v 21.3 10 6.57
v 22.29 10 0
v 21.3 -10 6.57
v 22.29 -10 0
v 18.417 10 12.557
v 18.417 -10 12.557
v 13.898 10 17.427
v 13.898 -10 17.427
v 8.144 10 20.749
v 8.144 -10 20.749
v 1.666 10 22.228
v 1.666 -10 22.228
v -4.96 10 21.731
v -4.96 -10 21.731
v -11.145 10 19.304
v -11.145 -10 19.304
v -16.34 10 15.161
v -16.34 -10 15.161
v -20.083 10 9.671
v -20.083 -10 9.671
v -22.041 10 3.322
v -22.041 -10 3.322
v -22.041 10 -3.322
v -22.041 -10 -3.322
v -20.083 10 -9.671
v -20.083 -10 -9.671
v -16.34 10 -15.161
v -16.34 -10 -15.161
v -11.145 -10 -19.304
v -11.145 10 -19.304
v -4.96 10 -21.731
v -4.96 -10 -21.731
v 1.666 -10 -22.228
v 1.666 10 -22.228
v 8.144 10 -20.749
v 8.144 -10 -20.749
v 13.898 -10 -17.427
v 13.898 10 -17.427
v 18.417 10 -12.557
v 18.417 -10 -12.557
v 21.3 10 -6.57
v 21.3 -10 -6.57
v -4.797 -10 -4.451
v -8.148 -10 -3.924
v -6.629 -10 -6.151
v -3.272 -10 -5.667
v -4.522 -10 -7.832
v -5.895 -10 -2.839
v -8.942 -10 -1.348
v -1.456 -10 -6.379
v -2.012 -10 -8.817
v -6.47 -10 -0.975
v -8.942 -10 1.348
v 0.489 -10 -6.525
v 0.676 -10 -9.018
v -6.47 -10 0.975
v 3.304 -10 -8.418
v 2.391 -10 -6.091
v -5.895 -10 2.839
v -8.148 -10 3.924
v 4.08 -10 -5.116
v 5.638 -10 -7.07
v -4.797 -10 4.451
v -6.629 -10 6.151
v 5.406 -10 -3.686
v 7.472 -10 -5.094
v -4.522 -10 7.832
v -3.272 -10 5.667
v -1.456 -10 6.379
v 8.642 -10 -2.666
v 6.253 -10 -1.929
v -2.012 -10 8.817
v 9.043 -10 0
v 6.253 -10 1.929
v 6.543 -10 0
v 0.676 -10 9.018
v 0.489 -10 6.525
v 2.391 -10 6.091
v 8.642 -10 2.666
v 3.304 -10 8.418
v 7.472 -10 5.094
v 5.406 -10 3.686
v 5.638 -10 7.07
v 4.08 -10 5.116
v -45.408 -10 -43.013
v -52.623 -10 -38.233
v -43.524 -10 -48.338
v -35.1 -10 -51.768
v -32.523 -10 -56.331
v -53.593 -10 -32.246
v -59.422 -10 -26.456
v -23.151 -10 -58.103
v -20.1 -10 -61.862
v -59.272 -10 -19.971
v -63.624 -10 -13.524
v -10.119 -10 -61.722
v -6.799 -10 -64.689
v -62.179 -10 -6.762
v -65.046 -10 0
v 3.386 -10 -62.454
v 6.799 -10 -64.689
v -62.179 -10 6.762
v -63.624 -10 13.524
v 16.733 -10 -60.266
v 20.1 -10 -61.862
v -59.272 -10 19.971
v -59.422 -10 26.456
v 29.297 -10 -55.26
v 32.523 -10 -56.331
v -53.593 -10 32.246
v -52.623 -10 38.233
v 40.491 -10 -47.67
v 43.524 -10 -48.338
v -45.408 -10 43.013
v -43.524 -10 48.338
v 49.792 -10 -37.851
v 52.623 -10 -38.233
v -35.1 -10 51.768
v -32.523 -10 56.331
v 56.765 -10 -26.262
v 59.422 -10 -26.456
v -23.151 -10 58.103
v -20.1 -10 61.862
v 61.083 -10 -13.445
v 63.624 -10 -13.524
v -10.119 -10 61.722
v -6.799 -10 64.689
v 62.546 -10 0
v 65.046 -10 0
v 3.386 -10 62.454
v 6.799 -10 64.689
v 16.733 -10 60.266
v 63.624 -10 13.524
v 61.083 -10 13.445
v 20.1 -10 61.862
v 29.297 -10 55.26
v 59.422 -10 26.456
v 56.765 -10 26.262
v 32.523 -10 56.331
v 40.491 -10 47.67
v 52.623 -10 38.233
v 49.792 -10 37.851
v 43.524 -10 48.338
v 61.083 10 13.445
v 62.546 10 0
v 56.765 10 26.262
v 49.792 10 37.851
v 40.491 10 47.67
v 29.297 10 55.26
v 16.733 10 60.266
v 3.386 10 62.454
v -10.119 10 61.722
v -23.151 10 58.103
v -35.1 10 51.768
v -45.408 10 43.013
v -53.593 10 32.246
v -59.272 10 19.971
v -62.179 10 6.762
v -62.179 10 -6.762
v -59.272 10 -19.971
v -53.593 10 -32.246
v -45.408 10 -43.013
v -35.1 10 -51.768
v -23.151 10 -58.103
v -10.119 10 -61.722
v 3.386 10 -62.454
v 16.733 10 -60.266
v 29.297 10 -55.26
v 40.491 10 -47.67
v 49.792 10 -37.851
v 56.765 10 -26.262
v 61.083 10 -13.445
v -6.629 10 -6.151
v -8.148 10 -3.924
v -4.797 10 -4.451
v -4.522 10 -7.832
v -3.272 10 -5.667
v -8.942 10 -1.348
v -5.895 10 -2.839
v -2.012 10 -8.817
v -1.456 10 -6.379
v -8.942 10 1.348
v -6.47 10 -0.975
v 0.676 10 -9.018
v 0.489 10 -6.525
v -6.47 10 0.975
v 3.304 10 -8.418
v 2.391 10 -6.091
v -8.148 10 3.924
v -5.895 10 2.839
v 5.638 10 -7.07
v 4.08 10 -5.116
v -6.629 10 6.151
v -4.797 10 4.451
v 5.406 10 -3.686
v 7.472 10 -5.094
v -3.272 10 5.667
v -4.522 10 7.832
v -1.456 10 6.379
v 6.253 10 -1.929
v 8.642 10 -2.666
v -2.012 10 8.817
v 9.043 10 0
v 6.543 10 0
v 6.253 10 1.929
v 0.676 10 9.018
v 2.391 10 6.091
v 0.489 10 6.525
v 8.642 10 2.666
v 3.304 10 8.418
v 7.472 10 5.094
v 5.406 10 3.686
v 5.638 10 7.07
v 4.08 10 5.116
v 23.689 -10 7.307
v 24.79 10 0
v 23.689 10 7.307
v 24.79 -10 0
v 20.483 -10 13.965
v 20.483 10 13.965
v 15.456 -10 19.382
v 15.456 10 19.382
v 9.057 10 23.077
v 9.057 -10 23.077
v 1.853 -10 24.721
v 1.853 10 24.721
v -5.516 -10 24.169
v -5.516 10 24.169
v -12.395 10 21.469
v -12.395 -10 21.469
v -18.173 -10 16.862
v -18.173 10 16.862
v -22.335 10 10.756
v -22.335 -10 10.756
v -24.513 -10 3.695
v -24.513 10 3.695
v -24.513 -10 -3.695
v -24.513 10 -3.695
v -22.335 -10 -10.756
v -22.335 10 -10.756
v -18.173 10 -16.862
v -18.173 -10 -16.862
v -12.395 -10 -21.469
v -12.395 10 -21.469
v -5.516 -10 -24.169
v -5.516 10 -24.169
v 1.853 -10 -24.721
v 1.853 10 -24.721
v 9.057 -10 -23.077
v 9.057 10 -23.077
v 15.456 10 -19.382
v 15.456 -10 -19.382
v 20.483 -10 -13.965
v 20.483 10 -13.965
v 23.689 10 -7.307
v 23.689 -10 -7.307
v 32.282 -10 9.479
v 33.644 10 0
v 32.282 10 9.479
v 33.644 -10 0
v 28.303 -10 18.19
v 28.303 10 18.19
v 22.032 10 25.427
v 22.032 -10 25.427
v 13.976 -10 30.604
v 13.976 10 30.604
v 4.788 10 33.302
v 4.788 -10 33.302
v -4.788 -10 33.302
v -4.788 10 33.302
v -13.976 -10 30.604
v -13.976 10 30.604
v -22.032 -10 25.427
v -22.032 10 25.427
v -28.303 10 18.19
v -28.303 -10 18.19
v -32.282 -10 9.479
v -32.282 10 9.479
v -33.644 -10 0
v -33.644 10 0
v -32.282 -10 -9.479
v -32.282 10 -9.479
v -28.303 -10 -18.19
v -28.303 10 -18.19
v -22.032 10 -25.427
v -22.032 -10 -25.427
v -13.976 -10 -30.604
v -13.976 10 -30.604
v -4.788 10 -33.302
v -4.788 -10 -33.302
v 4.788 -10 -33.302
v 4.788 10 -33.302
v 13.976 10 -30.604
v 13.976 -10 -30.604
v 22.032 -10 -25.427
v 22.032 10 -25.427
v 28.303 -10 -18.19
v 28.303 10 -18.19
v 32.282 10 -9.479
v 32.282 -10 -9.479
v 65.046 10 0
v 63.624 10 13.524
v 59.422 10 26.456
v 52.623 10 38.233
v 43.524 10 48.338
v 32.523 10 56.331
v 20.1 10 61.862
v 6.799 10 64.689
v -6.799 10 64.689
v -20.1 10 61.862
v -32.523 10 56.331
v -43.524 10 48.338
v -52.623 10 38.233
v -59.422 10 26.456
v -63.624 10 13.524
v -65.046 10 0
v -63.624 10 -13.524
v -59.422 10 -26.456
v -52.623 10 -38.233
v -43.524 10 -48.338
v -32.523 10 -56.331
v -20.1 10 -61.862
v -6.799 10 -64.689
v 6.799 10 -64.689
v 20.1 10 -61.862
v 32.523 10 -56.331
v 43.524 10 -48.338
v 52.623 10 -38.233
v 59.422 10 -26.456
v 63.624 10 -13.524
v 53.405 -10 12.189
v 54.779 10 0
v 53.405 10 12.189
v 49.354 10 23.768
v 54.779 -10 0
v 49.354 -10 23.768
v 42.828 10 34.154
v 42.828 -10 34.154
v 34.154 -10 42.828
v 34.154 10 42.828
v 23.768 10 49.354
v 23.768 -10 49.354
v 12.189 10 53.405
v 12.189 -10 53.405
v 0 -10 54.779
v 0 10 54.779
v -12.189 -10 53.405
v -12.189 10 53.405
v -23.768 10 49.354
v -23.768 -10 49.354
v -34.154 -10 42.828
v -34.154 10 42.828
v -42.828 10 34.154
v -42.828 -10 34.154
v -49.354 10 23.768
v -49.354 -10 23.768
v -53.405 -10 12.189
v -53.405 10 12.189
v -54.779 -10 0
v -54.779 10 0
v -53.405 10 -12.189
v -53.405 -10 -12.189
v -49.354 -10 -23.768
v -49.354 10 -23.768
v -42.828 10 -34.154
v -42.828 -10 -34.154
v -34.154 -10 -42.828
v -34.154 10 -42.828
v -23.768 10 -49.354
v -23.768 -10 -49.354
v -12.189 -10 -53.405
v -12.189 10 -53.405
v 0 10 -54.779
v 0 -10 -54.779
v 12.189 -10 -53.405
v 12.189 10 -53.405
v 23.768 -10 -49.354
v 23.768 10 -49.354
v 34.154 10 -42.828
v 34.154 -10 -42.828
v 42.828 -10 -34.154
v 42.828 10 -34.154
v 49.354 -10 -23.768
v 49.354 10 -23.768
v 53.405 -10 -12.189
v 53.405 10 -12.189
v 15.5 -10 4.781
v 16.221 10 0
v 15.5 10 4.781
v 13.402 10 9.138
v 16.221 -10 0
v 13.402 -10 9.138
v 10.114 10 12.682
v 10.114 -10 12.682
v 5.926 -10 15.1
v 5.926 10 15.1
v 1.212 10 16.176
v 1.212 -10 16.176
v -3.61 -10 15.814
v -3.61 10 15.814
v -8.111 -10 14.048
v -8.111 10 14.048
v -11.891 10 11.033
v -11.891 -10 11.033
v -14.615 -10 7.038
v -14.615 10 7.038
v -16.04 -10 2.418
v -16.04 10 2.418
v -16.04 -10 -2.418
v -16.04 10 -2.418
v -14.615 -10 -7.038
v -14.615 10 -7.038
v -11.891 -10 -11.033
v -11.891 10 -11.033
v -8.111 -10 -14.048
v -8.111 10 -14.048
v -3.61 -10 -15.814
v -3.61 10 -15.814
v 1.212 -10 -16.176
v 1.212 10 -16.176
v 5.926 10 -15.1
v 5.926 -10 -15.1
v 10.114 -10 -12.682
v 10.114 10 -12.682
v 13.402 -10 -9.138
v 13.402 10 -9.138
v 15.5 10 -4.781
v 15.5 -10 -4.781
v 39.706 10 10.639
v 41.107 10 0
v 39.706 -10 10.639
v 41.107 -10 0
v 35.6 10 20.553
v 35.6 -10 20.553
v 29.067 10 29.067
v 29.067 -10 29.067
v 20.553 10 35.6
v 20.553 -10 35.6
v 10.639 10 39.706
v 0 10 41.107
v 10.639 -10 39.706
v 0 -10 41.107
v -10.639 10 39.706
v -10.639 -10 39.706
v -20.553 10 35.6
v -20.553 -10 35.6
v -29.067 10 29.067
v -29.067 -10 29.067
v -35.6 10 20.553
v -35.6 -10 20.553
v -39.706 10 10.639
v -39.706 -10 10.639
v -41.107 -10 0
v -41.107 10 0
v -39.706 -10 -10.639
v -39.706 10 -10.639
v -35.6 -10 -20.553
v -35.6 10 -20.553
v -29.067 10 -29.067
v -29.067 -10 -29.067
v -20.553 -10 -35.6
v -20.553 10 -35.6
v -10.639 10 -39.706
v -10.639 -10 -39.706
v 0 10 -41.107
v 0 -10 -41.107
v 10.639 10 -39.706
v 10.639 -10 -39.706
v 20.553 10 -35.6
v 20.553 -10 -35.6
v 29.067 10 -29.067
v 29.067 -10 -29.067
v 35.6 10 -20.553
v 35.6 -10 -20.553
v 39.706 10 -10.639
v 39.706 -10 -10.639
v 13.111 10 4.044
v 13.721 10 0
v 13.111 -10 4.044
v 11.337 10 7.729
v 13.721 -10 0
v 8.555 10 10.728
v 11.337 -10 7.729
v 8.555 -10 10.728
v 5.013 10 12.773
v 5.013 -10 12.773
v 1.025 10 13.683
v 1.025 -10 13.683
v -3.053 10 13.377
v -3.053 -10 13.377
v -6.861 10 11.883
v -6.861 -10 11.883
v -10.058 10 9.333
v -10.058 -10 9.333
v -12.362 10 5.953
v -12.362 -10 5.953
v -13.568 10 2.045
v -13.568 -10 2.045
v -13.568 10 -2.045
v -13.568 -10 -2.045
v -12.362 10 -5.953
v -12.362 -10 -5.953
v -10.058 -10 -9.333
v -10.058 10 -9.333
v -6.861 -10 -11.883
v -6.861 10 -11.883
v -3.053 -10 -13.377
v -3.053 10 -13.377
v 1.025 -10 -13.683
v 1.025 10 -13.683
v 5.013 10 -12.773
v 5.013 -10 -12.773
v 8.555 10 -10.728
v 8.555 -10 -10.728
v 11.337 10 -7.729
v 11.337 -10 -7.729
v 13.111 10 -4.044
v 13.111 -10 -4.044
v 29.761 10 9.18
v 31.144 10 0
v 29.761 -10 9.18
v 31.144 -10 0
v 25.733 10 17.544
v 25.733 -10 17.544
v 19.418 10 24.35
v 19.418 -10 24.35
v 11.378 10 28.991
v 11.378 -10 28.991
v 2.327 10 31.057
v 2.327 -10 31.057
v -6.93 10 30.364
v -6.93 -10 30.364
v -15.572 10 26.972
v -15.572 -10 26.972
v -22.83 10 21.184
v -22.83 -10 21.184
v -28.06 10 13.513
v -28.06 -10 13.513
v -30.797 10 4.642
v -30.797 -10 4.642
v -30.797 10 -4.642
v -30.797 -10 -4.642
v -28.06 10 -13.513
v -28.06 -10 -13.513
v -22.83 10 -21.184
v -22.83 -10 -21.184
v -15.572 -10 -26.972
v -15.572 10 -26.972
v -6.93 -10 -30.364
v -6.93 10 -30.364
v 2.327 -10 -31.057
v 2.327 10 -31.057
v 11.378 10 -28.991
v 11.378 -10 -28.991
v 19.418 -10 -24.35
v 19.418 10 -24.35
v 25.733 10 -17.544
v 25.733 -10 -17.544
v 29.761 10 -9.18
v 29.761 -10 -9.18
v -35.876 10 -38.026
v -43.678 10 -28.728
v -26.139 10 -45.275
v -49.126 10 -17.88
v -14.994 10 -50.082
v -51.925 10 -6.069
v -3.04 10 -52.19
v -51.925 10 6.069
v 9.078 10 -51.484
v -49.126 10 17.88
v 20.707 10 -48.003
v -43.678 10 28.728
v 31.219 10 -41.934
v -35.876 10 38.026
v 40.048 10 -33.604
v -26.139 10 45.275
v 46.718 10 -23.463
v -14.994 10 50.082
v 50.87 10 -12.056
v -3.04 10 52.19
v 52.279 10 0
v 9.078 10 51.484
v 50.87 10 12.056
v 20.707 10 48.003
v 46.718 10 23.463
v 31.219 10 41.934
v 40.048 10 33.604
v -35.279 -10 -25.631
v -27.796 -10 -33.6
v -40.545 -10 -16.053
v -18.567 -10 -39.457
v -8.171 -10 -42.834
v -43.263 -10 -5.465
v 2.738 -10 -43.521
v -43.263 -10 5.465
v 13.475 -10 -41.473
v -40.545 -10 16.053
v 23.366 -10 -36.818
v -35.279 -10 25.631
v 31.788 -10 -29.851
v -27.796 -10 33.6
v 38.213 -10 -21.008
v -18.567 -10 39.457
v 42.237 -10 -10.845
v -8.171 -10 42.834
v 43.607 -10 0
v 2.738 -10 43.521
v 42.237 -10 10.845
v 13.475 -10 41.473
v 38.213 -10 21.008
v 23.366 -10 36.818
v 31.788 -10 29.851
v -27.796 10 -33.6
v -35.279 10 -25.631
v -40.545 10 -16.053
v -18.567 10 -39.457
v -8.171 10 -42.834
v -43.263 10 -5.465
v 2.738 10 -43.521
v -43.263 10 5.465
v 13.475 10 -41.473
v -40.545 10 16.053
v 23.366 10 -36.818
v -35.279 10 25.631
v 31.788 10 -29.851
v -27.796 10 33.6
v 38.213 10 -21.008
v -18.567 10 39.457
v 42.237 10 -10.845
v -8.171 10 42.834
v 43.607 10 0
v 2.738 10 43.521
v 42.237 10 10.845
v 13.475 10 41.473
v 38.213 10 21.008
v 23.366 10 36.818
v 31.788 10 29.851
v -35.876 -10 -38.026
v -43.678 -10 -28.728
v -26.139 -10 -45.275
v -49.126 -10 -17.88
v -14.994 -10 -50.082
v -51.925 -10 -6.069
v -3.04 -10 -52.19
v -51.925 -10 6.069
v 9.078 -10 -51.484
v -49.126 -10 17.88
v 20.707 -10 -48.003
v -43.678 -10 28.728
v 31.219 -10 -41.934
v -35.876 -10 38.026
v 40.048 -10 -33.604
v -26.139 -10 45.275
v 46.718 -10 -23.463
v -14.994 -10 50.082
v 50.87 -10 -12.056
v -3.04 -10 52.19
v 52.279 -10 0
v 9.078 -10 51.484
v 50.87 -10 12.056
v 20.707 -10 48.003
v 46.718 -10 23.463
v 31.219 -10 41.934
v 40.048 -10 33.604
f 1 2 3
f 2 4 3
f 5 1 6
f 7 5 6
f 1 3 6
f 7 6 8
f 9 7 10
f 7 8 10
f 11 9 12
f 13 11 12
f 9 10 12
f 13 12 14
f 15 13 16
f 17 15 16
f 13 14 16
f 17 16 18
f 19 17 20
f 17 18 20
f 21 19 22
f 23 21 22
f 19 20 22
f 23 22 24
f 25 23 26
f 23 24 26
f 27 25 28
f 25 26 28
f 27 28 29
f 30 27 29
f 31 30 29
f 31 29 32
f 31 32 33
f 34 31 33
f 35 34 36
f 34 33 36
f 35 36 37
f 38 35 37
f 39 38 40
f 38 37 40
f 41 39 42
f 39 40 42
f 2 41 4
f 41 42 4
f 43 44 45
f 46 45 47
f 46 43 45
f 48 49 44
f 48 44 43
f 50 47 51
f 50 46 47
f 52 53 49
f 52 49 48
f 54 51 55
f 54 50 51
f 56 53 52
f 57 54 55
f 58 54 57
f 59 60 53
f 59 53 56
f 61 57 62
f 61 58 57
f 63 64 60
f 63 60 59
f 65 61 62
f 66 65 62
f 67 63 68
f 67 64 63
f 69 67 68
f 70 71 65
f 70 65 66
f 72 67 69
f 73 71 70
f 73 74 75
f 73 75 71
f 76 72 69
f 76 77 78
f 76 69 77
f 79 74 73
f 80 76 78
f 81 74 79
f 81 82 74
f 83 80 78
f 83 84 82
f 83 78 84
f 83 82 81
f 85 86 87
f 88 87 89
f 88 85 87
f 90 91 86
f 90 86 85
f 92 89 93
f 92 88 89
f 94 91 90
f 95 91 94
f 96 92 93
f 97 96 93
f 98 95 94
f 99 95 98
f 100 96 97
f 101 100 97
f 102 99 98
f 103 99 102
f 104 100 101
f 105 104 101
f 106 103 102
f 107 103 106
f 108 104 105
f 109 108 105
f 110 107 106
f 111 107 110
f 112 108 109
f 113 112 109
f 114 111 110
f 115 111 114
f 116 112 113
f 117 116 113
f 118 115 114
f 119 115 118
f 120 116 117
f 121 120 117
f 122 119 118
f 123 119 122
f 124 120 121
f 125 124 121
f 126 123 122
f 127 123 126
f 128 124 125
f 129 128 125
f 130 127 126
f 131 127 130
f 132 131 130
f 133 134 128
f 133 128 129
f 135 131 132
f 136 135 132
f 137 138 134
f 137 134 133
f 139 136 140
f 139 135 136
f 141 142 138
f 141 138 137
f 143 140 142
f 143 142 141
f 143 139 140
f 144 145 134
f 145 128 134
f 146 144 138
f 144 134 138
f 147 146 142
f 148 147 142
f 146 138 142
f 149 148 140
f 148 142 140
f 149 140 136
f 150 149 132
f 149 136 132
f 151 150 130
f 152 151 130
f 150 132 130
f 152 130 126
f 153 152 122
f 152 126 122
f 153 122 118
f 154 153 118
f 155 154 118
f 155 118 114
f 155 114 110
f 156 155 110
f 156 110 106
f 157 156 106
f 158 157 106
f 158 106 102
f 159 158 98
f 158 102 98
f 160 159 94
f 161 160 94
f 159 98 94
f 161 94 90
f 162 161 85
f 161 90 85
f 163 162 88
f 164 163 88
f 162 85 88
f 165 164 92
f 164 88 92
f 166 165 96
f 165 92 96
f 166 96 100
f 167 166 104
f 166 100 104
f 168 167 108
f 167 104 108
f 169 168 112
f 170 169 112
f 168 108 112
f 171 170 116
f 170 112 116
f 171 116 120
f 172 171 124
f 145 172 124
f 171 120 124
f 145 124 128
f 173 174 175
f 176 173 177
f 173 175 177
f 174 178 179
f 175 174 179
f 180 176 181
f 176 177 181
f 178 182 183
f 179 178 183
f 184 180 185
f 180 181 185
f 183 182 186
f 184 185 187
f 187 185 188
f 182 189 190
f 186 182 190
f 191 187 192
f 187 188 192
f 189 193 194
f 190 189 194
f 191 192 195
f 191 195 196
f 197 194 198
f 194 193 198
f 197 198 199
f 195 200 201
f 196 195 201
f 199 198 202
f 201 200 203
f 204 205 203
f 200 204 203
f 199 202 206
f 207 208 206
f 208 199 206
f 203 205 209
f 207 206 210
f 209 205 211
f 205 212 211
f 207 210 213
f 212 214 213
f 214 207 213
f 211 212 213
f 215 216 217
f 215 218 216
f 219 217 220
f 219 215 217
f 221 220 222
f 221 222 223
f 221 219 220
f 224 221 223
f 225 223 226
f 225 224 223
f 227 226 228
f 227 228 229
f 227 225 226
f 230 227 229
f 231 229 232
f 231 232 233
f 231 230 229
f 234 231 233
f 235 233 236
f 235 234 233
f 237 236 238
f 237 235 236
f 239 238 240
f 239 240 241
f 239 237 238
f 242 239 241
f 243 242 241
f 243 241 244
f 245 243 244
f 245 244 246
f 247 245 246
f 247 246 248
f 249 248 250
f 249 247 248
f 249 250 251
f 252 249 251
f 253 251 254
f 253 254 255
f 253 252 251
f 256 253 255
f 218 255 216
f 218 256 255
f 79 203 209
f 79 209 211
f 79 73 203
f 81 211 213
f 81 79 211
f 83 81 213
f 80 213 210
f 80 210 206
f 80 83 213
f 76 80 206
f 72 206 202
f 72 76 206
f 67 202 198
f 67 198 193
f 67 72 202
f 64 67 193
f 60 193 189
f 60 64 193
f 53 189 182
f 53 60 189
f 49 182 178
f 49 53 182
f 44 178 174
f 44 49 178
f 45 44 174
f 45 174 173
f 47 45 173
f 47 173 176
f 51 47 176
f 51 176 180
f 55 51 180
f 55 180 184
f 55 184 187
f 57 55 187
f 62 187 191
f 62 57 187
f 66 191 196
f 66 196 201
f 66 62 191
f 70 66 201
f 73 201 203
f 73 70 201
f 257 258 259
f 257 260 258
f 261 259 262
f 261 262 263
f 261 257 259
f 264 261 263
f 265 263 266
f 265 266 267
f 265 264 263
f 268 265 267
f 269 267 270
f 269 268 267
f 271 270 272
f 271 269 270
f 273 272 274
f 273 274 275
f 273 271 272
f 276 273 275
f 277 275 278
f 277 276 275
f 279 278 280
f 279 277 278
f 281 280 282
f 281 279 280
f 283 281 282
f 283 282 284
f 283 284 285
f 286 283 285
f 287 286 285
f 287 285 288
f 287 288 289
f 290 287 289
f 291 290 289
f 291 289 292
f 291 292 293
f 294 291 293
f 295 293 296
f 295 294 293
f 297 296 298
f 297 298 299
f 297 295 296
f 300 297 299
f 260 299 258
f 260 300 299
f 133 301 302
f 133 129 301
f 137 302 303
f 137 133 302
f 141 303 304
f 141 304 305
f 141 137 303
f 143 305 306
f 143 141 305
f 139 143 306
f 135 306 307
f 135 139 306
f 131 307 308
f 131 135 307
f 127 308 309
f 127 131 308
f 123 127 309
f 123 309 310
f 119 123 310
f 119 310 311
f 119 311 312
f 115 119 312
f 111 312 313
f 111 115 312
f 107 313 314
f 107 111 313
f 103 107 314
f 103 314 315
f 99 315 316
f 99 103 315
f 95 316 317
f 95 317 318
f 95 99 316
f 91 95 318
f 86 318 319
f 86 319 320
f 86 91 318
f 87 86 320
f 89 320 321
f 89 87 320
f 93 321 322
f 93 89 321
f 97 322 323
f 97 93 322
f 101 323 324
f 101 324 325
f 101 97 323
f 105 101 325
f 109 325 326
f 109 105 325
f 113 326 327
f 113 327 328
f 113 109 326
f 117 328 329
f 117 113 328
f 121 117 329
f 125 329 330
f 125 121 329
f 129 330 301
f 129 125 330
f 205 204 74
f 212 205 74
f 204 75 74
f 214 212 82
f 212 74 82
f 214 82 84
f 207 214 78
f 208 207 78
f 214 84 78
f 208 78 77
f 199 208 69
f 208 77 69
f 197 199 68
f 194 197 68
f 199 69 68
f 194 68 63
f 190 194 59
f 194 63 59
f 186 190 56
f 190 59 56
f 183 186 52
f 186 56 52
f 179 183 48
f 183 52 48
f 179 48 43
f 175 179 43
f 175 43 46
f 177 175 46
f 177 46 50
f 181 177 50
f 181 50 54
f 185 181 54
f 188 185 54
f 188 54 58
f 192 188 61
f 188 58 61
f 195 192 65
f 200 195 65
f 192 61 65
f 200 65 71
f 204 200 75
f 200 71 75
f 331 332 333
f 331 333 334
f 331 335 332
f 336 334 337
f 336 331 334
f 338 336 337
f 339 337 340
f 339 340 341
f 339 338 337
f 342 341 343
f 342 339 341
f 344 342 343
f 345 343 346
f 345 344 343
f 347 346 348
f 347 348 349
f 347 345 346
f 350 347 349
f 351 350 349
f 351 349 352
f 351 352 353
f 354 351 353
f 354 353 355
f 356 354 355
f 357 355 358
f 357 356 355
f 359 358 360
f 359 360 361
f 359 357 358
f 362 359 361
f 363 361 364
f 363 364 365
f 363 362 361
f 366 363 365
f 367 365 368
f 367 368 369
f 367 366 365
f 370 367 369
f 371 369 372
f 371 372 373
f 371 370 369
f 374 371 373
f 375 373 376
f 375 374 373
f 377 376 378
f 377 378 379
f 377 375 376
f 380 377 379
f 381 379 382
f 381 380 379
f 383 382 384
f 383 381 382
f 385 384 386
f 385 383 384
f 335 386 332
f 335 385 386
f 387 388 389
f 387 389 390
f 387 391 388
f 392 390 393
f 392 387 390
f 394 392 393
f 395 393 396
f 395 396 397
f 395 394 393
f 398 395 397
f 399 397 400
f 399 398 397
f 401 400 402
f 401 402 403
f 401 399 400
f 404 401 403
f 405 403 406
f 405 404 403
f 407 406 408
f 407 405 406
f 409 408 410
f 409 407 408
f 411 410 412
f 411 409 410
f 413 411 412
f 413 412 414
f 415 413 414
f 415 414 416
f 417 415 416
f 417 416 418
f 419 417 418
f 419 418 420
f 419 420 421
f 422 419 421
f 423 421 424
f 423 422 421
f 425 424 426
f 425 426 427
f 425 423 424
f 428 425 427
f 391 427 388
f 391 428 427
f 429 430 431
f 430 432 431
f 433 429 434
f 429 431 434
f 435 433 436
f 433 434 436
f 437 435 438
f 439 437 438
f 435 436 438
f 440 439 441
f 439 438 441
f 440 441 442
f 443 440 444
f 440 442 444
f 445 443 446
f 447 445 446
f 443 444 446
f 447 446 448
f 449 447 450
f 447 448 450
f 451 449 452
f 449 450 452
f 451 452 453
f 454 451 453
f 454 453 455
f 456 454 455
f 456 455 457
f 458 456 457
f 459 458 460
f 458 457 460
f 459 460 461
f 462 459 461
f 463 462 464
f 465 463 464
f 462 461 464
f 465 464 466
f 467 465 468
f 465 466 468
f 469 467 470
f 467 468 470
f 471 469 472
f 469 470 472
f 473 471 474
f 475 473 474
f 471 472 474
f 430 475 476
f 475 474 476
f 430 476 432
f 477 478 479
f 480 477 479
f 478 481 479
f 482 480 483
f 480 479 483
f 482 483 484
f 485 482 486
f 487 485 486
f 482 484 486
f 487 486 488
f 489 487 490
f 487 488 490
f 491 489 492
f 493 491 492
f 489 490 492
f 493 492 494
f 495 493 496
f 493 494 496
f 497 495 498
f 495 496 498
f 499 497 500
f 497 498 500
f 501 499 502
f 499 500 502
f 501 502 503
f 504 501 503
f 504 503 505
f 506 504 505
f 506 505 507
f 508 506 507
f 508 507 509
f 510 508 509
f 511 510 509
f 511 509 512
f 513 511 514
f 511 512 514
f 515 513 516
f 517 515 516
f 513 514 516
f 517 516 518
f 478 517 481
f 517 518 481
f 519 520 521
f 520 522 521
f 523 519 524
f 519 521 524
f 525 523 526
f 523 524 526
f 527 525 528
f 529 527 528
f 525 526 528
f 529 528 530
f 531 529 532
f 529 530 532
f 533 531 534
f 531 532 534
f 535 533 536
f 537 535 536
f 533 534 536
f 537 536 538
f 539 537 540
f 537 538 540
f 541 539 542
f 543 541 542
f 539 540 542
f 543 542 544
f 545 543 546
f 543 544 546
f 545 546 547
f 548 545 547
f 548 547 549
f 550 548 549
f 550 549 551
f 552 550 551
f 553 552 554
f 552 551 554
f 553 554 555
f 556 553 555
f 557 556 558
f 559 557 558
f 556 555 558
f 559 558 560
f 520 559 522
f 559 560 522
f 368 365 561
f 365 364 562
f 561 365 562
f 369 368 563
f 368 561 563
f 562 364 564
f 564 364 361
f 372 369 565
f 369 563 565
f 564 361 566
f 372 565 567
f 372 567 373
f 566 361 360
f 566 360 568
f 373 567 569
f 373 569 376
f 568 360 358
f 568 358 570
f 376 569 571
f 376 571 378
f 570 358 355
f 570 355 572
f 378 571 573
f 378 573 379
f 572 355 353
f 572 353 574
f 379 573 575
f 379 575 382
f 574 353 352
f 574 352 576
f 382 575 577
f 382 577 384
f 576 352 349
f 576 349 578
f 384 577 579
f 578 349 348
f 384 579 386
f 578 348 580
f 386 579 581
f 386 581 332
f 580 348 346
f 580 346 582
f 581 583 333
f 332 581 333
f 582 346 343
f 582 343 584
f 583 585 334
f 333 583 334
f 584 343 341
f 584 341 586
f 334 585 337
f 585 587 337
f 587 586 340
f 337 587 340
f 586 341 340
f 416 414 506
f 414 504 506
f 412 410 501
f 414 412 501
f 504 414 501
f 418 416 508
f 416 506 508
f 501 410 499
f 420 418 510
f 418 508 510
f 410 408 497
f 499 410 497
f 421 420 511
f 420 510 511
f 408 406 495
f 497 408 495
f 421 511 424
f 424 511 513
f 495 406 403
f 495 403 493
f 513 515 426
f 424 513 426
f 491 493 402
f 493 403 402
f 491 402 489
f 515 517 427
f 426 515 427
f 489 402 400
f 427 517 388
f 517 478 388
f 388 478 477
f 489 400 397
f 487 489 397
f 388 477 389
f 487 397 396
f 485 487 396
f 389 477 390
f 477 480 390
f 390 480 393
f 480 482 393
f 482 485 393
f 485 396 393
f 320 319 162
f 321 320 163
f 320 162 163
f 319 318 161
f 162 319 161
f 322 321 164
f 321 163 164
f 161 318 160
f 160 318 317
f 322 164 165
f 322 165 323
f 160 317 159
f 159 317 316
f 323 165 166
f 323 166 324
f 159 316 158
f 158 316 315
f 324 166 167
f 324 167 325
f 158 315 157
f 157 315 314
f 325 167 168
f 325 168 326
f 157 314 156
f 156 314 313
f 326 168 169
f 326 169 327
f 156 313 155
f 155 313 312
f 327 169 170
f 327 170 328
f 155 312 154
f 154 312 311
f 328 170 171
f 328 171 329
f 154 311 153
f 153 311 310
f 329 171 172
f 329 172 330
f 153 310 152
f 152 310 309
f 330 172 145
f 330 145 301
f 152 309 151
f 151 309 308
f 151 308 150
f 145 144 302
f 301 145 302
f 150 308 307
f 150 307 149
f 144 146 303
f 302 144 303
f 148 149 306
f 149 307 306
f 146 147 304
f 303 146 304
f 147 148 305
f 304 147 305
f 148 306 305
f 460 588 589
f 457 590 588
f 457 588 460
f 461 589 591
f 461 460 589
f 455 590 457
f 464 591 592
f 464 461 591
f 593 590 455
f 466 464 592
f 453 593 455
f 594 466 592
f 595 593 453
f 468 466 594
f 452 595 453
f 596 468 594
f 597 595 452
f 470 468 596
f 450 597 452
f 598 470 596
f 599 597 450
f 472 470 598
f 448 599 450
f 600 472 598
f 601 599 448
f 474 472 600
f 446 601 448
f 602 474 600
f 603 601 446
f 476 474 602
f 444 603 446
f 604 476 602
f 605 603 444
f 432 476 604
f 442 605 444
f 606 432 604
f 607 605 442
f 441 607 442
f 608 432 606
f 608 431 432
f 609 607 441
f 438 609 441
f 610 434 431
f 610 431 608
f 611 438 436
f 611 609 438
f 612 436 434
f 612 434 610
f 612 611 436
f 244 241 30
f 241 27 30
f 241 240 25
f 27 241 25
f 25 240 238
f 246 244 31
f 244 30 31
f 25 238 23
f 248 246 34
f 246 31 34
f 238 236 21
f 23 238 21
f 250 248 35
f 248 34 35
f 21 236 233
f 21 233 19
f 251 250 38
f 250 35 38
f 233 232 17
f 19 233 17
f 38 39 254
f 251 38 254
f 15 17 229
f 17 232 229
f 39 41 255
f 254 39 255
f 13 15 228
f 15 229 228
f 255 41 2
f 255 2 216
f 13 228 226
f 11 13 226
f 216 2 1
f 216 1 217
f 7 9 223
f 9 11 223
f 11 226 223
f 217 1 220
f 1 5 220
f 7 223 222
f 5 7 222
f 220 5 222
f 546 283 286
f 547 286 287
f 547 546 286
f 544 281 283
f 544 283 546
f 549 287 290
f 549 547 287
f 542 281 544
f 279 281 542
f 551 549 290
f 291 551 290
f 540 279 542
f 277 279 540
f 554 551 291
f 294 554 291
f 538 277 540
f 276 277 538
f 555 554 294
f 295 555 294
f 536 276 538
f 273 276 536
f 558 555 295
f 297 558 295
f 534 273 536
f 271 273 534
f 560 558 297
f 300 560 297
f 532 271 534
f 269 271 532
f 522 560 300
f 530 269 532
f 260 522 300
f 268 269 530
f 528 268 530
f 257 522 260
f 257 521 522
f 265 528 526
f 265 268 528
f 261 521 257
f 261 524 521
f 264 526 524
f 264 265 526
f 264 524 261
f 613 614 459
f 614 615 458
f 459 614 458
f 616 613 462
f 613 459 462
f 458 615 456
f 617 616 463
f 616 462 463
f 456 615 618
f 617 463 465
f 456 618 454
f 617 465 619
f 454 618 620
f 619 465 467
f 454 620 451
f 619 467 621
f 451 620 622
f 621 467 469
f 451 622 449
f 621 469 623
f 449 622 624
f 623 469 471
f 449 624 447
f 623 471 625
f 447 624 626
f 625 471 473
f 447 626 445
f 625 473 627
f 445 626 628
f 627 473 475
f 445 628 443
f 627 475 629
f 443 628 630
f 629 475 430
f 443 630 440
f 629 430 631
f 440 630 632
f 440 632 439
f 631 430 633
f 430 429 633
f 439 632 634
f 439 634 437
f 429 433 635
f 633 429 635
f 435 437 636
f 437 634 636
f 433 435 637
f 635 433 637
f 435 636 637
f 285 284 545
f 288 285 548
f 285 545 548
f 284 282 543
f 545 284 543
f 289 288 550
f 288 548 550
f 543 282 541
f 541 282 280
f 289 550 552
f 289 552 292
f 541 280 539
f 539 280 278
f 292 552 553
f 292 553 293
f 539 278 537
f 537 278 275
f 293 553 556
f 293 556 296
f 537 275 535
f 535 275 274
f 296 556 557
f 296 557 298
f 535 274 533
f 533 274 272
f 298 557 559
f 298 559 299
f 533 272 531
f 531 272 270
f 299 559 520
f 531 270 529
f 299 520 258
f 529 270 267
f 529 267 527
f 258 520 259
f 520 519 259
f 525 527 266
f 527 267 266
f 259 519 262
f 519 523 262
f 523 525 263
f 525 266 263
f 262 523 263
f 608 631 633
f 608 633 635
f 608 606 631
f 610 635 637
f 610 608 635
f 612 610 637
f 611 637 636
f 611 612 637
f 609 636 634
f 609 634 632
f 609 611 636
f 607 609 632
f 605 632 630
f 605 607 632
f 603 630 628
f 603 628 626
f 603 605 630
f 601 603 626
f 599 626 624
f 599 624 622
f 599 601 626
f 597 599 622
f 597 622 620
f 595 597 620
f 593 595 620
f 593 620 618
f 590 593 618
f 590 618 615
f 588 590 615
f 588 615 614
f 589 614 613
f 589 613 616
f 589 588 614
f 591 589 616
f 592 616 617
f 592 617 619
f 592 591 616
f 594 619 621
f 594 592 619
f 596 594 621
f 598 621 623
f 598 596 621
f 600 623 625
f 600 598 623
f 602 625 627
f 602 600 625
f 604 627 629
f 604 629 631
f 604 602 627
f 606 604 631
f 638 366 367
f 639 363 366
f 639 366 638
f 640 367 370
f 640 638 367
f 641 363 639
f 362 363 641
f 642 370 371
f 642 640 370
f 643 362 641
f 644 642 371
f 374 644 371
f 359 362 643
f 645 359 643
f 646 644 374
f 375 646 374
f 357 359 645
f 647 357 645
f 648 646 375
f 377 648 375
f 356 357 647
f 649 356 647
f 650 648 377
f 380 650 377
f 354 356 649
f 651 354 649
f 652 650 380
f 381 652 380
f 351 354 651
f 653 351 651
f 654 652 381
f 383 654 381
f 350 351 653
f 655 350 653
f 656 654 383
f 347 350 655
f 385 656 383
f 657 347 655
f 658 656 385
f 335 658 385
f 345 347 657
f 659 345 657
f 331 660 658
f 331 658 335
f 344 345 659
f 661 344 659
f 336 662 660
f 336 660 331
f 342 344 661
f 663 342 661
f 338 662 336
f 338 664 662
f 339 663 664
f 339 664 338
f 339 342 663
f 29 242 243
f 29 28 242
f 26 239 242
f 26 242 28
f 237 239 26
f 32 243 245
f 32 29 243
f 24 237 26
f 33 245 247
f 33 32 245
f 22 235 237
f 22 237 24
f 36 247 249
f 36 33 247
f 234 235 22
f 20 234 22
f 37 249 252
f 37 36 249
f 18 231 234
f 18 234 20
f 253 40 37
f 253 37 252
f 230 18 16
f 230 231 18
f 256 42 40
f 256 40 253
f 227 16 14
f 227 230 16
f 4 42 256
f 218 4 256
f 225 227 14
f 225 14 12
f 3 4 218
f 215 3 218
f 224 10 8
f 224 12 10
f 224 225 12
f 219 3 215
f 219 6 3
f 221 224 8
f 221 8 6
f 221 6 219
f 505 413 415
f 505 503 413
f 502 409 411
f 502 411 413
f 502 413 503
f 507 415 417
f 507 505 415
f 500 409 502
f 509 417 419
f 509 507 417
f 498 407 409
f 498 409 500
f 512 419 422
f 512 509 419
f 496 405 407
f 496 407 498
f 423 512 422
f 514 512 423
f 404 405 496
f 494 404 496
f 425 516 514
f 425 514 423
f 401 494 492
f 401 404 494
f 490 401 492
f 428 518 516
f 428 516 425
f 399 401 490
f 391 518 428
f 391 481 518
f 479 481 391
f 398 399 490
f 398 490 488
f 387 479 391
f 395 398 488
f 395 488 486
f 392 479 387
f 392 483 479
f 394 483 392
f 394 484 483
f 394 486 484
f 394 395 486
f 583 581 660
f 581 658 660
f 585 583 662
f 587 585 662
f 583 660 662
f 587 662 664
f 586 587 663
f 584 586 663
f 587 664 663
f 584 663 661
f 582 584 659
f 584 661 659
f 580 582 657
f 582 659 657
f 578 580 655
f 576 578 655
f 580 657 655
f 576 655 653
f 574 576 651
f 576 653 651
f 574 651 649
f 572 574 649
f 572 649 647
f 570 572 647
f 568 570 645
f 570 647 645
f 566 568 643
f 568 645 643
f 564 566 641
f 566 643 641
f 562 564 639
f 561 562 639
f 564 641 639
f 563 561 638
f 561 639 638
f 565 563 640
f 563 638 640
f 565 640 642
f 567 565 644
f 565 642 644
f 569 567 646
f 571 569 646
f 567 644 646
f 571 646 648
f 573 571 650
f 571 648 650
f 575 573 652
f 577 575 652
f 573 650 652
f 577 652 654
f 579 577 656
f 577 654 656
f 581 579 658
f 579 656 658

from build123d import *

# Parameters (mm, degrees)
F0_R      = 65.045609
F1_DEPTH  = 10
F2_T      = -2.5
F3_R      = 54.778728
F4_DEPTH  = 10
F5_T      = -2.5
F6_R      = 43.606832
F7_DEPTH  = 10
F8_T      = -2.5
F9_R      = 33.644371
F10_DEPTH = 10
F11_T     = -2.5
F12_R     = 24.790235
F13_DEPTH = 10
F14_T     = -2.5
F15_R     = 16.221031
F16_DEPTH = 10
F17_T     = -2.5
F18_R     = 9.04343
F19_DEPTH = 10
F20_T     = -2.5


with BuildPart() as f1:
    # F0 (on Front) → F1 (new body, symmetric)
    with BuildSketch(Plane.XZ):
        Circle(F0_R)
    extrude(amount=F1_DEPTH, both=True)

    # F2
    f2_openings = [f1.faces().sort_by_distance(p)[0] for p in [
        (0, -10, 0),
        (0, 10, 0),
    ]]
    offset(amount=F2_T, openings=f2_openings)


with BuildPart() as f4:
    # F3 (on Front) → F4 (new body, symmetric)
    with BuildSketch(Plane.XZ):
        Circle(F3_R)
    extrude(amount=F4_DEPTH, both=True)

    # F5
    f5_openings = [f4.faces().sort_by_distance(p)[0] for p in [
        (0, -10, 0),
        (0, 10, 0),
    ]]
    offset(amount=F5_T, openings=f5_openings)


with BuildPart() as f7:
    # F6 (on Front) → F7 (new body, symmetric)
    with BuildSketch(Plane.XZ):
        Circle(F6_R)
    extrude(amount=F7_DEPTH, both=True)

    # F8
    f8_openings = [f7.faces().sort_by_distance(p)[0] for p in [
        (0, -10, 0),
        (0, 10, 0),
    ]]
    offset(amount=F8_T, openings=f8_openings)


with BuildPart() as f10:
    # F9 (on Front) → F10 (new body, symmetric)
    with BuildSketch(Plane.XZ):
        Circle(F9_R)
    extrude(amount=F10_DEPTH, both=True)

    # F11
    f11_openings = [f10.faces().sort_by_distance(p)[0] for p in [
        (0, -10, 0),
        (0, 10, 0),
    ]]
    offset(amount=F11_T, openings=f11_openings)


with BuildPart() as f13:
    # F12 (on Front) → F13 (new body, symmetric)
    with BuildSketch(Plane.XZ):
        Circle(F12_R)
    extrude(amount=F13_DEPTH, both=True)

    # F14
    f14_openings = [f13.faces().sort_by_distance(p)[0] for p in [
        (0, -10, 0),
        (0, 10, 0),
    ]]
    offset(amount=F14_T, openings=f14_openings)


with BuildPart() as f16:
    # F15 (on Front) → F16 (new body, symmetric)
    with BuildSketch(Plane.XZ):
        Circle(F15_R)
    extrude(amount=F16_DEPTH, both=True)

    # F17
    f17_openings = [f16.faces().sort_by_distance(p)[0] for p in [
        (0, -10, 0),
        (0, 10, 0),
    ]]
    offset(amount=F17_T, openings=f17_openings)


with BuildPart() as f19:
    # F18 (on Front) → F19 (new body, symmetric)
    with BuildSketch(Plane.XZ):
        Circle(F18_R)
    extrude(amount=F19_DEPTH, both=True)

    # F20
    f20_openings = [f19.faces().sort_by_distance(p)[0] for p in [
        (0, -10, 0),
        (0, 10, 0),
    ]]
    offset(amount=F20_T, openings=f20_openings)


solid = Compound([f1.part, f4.part, f7.part, f10.part, f13.part, f16.part, f19.part])
